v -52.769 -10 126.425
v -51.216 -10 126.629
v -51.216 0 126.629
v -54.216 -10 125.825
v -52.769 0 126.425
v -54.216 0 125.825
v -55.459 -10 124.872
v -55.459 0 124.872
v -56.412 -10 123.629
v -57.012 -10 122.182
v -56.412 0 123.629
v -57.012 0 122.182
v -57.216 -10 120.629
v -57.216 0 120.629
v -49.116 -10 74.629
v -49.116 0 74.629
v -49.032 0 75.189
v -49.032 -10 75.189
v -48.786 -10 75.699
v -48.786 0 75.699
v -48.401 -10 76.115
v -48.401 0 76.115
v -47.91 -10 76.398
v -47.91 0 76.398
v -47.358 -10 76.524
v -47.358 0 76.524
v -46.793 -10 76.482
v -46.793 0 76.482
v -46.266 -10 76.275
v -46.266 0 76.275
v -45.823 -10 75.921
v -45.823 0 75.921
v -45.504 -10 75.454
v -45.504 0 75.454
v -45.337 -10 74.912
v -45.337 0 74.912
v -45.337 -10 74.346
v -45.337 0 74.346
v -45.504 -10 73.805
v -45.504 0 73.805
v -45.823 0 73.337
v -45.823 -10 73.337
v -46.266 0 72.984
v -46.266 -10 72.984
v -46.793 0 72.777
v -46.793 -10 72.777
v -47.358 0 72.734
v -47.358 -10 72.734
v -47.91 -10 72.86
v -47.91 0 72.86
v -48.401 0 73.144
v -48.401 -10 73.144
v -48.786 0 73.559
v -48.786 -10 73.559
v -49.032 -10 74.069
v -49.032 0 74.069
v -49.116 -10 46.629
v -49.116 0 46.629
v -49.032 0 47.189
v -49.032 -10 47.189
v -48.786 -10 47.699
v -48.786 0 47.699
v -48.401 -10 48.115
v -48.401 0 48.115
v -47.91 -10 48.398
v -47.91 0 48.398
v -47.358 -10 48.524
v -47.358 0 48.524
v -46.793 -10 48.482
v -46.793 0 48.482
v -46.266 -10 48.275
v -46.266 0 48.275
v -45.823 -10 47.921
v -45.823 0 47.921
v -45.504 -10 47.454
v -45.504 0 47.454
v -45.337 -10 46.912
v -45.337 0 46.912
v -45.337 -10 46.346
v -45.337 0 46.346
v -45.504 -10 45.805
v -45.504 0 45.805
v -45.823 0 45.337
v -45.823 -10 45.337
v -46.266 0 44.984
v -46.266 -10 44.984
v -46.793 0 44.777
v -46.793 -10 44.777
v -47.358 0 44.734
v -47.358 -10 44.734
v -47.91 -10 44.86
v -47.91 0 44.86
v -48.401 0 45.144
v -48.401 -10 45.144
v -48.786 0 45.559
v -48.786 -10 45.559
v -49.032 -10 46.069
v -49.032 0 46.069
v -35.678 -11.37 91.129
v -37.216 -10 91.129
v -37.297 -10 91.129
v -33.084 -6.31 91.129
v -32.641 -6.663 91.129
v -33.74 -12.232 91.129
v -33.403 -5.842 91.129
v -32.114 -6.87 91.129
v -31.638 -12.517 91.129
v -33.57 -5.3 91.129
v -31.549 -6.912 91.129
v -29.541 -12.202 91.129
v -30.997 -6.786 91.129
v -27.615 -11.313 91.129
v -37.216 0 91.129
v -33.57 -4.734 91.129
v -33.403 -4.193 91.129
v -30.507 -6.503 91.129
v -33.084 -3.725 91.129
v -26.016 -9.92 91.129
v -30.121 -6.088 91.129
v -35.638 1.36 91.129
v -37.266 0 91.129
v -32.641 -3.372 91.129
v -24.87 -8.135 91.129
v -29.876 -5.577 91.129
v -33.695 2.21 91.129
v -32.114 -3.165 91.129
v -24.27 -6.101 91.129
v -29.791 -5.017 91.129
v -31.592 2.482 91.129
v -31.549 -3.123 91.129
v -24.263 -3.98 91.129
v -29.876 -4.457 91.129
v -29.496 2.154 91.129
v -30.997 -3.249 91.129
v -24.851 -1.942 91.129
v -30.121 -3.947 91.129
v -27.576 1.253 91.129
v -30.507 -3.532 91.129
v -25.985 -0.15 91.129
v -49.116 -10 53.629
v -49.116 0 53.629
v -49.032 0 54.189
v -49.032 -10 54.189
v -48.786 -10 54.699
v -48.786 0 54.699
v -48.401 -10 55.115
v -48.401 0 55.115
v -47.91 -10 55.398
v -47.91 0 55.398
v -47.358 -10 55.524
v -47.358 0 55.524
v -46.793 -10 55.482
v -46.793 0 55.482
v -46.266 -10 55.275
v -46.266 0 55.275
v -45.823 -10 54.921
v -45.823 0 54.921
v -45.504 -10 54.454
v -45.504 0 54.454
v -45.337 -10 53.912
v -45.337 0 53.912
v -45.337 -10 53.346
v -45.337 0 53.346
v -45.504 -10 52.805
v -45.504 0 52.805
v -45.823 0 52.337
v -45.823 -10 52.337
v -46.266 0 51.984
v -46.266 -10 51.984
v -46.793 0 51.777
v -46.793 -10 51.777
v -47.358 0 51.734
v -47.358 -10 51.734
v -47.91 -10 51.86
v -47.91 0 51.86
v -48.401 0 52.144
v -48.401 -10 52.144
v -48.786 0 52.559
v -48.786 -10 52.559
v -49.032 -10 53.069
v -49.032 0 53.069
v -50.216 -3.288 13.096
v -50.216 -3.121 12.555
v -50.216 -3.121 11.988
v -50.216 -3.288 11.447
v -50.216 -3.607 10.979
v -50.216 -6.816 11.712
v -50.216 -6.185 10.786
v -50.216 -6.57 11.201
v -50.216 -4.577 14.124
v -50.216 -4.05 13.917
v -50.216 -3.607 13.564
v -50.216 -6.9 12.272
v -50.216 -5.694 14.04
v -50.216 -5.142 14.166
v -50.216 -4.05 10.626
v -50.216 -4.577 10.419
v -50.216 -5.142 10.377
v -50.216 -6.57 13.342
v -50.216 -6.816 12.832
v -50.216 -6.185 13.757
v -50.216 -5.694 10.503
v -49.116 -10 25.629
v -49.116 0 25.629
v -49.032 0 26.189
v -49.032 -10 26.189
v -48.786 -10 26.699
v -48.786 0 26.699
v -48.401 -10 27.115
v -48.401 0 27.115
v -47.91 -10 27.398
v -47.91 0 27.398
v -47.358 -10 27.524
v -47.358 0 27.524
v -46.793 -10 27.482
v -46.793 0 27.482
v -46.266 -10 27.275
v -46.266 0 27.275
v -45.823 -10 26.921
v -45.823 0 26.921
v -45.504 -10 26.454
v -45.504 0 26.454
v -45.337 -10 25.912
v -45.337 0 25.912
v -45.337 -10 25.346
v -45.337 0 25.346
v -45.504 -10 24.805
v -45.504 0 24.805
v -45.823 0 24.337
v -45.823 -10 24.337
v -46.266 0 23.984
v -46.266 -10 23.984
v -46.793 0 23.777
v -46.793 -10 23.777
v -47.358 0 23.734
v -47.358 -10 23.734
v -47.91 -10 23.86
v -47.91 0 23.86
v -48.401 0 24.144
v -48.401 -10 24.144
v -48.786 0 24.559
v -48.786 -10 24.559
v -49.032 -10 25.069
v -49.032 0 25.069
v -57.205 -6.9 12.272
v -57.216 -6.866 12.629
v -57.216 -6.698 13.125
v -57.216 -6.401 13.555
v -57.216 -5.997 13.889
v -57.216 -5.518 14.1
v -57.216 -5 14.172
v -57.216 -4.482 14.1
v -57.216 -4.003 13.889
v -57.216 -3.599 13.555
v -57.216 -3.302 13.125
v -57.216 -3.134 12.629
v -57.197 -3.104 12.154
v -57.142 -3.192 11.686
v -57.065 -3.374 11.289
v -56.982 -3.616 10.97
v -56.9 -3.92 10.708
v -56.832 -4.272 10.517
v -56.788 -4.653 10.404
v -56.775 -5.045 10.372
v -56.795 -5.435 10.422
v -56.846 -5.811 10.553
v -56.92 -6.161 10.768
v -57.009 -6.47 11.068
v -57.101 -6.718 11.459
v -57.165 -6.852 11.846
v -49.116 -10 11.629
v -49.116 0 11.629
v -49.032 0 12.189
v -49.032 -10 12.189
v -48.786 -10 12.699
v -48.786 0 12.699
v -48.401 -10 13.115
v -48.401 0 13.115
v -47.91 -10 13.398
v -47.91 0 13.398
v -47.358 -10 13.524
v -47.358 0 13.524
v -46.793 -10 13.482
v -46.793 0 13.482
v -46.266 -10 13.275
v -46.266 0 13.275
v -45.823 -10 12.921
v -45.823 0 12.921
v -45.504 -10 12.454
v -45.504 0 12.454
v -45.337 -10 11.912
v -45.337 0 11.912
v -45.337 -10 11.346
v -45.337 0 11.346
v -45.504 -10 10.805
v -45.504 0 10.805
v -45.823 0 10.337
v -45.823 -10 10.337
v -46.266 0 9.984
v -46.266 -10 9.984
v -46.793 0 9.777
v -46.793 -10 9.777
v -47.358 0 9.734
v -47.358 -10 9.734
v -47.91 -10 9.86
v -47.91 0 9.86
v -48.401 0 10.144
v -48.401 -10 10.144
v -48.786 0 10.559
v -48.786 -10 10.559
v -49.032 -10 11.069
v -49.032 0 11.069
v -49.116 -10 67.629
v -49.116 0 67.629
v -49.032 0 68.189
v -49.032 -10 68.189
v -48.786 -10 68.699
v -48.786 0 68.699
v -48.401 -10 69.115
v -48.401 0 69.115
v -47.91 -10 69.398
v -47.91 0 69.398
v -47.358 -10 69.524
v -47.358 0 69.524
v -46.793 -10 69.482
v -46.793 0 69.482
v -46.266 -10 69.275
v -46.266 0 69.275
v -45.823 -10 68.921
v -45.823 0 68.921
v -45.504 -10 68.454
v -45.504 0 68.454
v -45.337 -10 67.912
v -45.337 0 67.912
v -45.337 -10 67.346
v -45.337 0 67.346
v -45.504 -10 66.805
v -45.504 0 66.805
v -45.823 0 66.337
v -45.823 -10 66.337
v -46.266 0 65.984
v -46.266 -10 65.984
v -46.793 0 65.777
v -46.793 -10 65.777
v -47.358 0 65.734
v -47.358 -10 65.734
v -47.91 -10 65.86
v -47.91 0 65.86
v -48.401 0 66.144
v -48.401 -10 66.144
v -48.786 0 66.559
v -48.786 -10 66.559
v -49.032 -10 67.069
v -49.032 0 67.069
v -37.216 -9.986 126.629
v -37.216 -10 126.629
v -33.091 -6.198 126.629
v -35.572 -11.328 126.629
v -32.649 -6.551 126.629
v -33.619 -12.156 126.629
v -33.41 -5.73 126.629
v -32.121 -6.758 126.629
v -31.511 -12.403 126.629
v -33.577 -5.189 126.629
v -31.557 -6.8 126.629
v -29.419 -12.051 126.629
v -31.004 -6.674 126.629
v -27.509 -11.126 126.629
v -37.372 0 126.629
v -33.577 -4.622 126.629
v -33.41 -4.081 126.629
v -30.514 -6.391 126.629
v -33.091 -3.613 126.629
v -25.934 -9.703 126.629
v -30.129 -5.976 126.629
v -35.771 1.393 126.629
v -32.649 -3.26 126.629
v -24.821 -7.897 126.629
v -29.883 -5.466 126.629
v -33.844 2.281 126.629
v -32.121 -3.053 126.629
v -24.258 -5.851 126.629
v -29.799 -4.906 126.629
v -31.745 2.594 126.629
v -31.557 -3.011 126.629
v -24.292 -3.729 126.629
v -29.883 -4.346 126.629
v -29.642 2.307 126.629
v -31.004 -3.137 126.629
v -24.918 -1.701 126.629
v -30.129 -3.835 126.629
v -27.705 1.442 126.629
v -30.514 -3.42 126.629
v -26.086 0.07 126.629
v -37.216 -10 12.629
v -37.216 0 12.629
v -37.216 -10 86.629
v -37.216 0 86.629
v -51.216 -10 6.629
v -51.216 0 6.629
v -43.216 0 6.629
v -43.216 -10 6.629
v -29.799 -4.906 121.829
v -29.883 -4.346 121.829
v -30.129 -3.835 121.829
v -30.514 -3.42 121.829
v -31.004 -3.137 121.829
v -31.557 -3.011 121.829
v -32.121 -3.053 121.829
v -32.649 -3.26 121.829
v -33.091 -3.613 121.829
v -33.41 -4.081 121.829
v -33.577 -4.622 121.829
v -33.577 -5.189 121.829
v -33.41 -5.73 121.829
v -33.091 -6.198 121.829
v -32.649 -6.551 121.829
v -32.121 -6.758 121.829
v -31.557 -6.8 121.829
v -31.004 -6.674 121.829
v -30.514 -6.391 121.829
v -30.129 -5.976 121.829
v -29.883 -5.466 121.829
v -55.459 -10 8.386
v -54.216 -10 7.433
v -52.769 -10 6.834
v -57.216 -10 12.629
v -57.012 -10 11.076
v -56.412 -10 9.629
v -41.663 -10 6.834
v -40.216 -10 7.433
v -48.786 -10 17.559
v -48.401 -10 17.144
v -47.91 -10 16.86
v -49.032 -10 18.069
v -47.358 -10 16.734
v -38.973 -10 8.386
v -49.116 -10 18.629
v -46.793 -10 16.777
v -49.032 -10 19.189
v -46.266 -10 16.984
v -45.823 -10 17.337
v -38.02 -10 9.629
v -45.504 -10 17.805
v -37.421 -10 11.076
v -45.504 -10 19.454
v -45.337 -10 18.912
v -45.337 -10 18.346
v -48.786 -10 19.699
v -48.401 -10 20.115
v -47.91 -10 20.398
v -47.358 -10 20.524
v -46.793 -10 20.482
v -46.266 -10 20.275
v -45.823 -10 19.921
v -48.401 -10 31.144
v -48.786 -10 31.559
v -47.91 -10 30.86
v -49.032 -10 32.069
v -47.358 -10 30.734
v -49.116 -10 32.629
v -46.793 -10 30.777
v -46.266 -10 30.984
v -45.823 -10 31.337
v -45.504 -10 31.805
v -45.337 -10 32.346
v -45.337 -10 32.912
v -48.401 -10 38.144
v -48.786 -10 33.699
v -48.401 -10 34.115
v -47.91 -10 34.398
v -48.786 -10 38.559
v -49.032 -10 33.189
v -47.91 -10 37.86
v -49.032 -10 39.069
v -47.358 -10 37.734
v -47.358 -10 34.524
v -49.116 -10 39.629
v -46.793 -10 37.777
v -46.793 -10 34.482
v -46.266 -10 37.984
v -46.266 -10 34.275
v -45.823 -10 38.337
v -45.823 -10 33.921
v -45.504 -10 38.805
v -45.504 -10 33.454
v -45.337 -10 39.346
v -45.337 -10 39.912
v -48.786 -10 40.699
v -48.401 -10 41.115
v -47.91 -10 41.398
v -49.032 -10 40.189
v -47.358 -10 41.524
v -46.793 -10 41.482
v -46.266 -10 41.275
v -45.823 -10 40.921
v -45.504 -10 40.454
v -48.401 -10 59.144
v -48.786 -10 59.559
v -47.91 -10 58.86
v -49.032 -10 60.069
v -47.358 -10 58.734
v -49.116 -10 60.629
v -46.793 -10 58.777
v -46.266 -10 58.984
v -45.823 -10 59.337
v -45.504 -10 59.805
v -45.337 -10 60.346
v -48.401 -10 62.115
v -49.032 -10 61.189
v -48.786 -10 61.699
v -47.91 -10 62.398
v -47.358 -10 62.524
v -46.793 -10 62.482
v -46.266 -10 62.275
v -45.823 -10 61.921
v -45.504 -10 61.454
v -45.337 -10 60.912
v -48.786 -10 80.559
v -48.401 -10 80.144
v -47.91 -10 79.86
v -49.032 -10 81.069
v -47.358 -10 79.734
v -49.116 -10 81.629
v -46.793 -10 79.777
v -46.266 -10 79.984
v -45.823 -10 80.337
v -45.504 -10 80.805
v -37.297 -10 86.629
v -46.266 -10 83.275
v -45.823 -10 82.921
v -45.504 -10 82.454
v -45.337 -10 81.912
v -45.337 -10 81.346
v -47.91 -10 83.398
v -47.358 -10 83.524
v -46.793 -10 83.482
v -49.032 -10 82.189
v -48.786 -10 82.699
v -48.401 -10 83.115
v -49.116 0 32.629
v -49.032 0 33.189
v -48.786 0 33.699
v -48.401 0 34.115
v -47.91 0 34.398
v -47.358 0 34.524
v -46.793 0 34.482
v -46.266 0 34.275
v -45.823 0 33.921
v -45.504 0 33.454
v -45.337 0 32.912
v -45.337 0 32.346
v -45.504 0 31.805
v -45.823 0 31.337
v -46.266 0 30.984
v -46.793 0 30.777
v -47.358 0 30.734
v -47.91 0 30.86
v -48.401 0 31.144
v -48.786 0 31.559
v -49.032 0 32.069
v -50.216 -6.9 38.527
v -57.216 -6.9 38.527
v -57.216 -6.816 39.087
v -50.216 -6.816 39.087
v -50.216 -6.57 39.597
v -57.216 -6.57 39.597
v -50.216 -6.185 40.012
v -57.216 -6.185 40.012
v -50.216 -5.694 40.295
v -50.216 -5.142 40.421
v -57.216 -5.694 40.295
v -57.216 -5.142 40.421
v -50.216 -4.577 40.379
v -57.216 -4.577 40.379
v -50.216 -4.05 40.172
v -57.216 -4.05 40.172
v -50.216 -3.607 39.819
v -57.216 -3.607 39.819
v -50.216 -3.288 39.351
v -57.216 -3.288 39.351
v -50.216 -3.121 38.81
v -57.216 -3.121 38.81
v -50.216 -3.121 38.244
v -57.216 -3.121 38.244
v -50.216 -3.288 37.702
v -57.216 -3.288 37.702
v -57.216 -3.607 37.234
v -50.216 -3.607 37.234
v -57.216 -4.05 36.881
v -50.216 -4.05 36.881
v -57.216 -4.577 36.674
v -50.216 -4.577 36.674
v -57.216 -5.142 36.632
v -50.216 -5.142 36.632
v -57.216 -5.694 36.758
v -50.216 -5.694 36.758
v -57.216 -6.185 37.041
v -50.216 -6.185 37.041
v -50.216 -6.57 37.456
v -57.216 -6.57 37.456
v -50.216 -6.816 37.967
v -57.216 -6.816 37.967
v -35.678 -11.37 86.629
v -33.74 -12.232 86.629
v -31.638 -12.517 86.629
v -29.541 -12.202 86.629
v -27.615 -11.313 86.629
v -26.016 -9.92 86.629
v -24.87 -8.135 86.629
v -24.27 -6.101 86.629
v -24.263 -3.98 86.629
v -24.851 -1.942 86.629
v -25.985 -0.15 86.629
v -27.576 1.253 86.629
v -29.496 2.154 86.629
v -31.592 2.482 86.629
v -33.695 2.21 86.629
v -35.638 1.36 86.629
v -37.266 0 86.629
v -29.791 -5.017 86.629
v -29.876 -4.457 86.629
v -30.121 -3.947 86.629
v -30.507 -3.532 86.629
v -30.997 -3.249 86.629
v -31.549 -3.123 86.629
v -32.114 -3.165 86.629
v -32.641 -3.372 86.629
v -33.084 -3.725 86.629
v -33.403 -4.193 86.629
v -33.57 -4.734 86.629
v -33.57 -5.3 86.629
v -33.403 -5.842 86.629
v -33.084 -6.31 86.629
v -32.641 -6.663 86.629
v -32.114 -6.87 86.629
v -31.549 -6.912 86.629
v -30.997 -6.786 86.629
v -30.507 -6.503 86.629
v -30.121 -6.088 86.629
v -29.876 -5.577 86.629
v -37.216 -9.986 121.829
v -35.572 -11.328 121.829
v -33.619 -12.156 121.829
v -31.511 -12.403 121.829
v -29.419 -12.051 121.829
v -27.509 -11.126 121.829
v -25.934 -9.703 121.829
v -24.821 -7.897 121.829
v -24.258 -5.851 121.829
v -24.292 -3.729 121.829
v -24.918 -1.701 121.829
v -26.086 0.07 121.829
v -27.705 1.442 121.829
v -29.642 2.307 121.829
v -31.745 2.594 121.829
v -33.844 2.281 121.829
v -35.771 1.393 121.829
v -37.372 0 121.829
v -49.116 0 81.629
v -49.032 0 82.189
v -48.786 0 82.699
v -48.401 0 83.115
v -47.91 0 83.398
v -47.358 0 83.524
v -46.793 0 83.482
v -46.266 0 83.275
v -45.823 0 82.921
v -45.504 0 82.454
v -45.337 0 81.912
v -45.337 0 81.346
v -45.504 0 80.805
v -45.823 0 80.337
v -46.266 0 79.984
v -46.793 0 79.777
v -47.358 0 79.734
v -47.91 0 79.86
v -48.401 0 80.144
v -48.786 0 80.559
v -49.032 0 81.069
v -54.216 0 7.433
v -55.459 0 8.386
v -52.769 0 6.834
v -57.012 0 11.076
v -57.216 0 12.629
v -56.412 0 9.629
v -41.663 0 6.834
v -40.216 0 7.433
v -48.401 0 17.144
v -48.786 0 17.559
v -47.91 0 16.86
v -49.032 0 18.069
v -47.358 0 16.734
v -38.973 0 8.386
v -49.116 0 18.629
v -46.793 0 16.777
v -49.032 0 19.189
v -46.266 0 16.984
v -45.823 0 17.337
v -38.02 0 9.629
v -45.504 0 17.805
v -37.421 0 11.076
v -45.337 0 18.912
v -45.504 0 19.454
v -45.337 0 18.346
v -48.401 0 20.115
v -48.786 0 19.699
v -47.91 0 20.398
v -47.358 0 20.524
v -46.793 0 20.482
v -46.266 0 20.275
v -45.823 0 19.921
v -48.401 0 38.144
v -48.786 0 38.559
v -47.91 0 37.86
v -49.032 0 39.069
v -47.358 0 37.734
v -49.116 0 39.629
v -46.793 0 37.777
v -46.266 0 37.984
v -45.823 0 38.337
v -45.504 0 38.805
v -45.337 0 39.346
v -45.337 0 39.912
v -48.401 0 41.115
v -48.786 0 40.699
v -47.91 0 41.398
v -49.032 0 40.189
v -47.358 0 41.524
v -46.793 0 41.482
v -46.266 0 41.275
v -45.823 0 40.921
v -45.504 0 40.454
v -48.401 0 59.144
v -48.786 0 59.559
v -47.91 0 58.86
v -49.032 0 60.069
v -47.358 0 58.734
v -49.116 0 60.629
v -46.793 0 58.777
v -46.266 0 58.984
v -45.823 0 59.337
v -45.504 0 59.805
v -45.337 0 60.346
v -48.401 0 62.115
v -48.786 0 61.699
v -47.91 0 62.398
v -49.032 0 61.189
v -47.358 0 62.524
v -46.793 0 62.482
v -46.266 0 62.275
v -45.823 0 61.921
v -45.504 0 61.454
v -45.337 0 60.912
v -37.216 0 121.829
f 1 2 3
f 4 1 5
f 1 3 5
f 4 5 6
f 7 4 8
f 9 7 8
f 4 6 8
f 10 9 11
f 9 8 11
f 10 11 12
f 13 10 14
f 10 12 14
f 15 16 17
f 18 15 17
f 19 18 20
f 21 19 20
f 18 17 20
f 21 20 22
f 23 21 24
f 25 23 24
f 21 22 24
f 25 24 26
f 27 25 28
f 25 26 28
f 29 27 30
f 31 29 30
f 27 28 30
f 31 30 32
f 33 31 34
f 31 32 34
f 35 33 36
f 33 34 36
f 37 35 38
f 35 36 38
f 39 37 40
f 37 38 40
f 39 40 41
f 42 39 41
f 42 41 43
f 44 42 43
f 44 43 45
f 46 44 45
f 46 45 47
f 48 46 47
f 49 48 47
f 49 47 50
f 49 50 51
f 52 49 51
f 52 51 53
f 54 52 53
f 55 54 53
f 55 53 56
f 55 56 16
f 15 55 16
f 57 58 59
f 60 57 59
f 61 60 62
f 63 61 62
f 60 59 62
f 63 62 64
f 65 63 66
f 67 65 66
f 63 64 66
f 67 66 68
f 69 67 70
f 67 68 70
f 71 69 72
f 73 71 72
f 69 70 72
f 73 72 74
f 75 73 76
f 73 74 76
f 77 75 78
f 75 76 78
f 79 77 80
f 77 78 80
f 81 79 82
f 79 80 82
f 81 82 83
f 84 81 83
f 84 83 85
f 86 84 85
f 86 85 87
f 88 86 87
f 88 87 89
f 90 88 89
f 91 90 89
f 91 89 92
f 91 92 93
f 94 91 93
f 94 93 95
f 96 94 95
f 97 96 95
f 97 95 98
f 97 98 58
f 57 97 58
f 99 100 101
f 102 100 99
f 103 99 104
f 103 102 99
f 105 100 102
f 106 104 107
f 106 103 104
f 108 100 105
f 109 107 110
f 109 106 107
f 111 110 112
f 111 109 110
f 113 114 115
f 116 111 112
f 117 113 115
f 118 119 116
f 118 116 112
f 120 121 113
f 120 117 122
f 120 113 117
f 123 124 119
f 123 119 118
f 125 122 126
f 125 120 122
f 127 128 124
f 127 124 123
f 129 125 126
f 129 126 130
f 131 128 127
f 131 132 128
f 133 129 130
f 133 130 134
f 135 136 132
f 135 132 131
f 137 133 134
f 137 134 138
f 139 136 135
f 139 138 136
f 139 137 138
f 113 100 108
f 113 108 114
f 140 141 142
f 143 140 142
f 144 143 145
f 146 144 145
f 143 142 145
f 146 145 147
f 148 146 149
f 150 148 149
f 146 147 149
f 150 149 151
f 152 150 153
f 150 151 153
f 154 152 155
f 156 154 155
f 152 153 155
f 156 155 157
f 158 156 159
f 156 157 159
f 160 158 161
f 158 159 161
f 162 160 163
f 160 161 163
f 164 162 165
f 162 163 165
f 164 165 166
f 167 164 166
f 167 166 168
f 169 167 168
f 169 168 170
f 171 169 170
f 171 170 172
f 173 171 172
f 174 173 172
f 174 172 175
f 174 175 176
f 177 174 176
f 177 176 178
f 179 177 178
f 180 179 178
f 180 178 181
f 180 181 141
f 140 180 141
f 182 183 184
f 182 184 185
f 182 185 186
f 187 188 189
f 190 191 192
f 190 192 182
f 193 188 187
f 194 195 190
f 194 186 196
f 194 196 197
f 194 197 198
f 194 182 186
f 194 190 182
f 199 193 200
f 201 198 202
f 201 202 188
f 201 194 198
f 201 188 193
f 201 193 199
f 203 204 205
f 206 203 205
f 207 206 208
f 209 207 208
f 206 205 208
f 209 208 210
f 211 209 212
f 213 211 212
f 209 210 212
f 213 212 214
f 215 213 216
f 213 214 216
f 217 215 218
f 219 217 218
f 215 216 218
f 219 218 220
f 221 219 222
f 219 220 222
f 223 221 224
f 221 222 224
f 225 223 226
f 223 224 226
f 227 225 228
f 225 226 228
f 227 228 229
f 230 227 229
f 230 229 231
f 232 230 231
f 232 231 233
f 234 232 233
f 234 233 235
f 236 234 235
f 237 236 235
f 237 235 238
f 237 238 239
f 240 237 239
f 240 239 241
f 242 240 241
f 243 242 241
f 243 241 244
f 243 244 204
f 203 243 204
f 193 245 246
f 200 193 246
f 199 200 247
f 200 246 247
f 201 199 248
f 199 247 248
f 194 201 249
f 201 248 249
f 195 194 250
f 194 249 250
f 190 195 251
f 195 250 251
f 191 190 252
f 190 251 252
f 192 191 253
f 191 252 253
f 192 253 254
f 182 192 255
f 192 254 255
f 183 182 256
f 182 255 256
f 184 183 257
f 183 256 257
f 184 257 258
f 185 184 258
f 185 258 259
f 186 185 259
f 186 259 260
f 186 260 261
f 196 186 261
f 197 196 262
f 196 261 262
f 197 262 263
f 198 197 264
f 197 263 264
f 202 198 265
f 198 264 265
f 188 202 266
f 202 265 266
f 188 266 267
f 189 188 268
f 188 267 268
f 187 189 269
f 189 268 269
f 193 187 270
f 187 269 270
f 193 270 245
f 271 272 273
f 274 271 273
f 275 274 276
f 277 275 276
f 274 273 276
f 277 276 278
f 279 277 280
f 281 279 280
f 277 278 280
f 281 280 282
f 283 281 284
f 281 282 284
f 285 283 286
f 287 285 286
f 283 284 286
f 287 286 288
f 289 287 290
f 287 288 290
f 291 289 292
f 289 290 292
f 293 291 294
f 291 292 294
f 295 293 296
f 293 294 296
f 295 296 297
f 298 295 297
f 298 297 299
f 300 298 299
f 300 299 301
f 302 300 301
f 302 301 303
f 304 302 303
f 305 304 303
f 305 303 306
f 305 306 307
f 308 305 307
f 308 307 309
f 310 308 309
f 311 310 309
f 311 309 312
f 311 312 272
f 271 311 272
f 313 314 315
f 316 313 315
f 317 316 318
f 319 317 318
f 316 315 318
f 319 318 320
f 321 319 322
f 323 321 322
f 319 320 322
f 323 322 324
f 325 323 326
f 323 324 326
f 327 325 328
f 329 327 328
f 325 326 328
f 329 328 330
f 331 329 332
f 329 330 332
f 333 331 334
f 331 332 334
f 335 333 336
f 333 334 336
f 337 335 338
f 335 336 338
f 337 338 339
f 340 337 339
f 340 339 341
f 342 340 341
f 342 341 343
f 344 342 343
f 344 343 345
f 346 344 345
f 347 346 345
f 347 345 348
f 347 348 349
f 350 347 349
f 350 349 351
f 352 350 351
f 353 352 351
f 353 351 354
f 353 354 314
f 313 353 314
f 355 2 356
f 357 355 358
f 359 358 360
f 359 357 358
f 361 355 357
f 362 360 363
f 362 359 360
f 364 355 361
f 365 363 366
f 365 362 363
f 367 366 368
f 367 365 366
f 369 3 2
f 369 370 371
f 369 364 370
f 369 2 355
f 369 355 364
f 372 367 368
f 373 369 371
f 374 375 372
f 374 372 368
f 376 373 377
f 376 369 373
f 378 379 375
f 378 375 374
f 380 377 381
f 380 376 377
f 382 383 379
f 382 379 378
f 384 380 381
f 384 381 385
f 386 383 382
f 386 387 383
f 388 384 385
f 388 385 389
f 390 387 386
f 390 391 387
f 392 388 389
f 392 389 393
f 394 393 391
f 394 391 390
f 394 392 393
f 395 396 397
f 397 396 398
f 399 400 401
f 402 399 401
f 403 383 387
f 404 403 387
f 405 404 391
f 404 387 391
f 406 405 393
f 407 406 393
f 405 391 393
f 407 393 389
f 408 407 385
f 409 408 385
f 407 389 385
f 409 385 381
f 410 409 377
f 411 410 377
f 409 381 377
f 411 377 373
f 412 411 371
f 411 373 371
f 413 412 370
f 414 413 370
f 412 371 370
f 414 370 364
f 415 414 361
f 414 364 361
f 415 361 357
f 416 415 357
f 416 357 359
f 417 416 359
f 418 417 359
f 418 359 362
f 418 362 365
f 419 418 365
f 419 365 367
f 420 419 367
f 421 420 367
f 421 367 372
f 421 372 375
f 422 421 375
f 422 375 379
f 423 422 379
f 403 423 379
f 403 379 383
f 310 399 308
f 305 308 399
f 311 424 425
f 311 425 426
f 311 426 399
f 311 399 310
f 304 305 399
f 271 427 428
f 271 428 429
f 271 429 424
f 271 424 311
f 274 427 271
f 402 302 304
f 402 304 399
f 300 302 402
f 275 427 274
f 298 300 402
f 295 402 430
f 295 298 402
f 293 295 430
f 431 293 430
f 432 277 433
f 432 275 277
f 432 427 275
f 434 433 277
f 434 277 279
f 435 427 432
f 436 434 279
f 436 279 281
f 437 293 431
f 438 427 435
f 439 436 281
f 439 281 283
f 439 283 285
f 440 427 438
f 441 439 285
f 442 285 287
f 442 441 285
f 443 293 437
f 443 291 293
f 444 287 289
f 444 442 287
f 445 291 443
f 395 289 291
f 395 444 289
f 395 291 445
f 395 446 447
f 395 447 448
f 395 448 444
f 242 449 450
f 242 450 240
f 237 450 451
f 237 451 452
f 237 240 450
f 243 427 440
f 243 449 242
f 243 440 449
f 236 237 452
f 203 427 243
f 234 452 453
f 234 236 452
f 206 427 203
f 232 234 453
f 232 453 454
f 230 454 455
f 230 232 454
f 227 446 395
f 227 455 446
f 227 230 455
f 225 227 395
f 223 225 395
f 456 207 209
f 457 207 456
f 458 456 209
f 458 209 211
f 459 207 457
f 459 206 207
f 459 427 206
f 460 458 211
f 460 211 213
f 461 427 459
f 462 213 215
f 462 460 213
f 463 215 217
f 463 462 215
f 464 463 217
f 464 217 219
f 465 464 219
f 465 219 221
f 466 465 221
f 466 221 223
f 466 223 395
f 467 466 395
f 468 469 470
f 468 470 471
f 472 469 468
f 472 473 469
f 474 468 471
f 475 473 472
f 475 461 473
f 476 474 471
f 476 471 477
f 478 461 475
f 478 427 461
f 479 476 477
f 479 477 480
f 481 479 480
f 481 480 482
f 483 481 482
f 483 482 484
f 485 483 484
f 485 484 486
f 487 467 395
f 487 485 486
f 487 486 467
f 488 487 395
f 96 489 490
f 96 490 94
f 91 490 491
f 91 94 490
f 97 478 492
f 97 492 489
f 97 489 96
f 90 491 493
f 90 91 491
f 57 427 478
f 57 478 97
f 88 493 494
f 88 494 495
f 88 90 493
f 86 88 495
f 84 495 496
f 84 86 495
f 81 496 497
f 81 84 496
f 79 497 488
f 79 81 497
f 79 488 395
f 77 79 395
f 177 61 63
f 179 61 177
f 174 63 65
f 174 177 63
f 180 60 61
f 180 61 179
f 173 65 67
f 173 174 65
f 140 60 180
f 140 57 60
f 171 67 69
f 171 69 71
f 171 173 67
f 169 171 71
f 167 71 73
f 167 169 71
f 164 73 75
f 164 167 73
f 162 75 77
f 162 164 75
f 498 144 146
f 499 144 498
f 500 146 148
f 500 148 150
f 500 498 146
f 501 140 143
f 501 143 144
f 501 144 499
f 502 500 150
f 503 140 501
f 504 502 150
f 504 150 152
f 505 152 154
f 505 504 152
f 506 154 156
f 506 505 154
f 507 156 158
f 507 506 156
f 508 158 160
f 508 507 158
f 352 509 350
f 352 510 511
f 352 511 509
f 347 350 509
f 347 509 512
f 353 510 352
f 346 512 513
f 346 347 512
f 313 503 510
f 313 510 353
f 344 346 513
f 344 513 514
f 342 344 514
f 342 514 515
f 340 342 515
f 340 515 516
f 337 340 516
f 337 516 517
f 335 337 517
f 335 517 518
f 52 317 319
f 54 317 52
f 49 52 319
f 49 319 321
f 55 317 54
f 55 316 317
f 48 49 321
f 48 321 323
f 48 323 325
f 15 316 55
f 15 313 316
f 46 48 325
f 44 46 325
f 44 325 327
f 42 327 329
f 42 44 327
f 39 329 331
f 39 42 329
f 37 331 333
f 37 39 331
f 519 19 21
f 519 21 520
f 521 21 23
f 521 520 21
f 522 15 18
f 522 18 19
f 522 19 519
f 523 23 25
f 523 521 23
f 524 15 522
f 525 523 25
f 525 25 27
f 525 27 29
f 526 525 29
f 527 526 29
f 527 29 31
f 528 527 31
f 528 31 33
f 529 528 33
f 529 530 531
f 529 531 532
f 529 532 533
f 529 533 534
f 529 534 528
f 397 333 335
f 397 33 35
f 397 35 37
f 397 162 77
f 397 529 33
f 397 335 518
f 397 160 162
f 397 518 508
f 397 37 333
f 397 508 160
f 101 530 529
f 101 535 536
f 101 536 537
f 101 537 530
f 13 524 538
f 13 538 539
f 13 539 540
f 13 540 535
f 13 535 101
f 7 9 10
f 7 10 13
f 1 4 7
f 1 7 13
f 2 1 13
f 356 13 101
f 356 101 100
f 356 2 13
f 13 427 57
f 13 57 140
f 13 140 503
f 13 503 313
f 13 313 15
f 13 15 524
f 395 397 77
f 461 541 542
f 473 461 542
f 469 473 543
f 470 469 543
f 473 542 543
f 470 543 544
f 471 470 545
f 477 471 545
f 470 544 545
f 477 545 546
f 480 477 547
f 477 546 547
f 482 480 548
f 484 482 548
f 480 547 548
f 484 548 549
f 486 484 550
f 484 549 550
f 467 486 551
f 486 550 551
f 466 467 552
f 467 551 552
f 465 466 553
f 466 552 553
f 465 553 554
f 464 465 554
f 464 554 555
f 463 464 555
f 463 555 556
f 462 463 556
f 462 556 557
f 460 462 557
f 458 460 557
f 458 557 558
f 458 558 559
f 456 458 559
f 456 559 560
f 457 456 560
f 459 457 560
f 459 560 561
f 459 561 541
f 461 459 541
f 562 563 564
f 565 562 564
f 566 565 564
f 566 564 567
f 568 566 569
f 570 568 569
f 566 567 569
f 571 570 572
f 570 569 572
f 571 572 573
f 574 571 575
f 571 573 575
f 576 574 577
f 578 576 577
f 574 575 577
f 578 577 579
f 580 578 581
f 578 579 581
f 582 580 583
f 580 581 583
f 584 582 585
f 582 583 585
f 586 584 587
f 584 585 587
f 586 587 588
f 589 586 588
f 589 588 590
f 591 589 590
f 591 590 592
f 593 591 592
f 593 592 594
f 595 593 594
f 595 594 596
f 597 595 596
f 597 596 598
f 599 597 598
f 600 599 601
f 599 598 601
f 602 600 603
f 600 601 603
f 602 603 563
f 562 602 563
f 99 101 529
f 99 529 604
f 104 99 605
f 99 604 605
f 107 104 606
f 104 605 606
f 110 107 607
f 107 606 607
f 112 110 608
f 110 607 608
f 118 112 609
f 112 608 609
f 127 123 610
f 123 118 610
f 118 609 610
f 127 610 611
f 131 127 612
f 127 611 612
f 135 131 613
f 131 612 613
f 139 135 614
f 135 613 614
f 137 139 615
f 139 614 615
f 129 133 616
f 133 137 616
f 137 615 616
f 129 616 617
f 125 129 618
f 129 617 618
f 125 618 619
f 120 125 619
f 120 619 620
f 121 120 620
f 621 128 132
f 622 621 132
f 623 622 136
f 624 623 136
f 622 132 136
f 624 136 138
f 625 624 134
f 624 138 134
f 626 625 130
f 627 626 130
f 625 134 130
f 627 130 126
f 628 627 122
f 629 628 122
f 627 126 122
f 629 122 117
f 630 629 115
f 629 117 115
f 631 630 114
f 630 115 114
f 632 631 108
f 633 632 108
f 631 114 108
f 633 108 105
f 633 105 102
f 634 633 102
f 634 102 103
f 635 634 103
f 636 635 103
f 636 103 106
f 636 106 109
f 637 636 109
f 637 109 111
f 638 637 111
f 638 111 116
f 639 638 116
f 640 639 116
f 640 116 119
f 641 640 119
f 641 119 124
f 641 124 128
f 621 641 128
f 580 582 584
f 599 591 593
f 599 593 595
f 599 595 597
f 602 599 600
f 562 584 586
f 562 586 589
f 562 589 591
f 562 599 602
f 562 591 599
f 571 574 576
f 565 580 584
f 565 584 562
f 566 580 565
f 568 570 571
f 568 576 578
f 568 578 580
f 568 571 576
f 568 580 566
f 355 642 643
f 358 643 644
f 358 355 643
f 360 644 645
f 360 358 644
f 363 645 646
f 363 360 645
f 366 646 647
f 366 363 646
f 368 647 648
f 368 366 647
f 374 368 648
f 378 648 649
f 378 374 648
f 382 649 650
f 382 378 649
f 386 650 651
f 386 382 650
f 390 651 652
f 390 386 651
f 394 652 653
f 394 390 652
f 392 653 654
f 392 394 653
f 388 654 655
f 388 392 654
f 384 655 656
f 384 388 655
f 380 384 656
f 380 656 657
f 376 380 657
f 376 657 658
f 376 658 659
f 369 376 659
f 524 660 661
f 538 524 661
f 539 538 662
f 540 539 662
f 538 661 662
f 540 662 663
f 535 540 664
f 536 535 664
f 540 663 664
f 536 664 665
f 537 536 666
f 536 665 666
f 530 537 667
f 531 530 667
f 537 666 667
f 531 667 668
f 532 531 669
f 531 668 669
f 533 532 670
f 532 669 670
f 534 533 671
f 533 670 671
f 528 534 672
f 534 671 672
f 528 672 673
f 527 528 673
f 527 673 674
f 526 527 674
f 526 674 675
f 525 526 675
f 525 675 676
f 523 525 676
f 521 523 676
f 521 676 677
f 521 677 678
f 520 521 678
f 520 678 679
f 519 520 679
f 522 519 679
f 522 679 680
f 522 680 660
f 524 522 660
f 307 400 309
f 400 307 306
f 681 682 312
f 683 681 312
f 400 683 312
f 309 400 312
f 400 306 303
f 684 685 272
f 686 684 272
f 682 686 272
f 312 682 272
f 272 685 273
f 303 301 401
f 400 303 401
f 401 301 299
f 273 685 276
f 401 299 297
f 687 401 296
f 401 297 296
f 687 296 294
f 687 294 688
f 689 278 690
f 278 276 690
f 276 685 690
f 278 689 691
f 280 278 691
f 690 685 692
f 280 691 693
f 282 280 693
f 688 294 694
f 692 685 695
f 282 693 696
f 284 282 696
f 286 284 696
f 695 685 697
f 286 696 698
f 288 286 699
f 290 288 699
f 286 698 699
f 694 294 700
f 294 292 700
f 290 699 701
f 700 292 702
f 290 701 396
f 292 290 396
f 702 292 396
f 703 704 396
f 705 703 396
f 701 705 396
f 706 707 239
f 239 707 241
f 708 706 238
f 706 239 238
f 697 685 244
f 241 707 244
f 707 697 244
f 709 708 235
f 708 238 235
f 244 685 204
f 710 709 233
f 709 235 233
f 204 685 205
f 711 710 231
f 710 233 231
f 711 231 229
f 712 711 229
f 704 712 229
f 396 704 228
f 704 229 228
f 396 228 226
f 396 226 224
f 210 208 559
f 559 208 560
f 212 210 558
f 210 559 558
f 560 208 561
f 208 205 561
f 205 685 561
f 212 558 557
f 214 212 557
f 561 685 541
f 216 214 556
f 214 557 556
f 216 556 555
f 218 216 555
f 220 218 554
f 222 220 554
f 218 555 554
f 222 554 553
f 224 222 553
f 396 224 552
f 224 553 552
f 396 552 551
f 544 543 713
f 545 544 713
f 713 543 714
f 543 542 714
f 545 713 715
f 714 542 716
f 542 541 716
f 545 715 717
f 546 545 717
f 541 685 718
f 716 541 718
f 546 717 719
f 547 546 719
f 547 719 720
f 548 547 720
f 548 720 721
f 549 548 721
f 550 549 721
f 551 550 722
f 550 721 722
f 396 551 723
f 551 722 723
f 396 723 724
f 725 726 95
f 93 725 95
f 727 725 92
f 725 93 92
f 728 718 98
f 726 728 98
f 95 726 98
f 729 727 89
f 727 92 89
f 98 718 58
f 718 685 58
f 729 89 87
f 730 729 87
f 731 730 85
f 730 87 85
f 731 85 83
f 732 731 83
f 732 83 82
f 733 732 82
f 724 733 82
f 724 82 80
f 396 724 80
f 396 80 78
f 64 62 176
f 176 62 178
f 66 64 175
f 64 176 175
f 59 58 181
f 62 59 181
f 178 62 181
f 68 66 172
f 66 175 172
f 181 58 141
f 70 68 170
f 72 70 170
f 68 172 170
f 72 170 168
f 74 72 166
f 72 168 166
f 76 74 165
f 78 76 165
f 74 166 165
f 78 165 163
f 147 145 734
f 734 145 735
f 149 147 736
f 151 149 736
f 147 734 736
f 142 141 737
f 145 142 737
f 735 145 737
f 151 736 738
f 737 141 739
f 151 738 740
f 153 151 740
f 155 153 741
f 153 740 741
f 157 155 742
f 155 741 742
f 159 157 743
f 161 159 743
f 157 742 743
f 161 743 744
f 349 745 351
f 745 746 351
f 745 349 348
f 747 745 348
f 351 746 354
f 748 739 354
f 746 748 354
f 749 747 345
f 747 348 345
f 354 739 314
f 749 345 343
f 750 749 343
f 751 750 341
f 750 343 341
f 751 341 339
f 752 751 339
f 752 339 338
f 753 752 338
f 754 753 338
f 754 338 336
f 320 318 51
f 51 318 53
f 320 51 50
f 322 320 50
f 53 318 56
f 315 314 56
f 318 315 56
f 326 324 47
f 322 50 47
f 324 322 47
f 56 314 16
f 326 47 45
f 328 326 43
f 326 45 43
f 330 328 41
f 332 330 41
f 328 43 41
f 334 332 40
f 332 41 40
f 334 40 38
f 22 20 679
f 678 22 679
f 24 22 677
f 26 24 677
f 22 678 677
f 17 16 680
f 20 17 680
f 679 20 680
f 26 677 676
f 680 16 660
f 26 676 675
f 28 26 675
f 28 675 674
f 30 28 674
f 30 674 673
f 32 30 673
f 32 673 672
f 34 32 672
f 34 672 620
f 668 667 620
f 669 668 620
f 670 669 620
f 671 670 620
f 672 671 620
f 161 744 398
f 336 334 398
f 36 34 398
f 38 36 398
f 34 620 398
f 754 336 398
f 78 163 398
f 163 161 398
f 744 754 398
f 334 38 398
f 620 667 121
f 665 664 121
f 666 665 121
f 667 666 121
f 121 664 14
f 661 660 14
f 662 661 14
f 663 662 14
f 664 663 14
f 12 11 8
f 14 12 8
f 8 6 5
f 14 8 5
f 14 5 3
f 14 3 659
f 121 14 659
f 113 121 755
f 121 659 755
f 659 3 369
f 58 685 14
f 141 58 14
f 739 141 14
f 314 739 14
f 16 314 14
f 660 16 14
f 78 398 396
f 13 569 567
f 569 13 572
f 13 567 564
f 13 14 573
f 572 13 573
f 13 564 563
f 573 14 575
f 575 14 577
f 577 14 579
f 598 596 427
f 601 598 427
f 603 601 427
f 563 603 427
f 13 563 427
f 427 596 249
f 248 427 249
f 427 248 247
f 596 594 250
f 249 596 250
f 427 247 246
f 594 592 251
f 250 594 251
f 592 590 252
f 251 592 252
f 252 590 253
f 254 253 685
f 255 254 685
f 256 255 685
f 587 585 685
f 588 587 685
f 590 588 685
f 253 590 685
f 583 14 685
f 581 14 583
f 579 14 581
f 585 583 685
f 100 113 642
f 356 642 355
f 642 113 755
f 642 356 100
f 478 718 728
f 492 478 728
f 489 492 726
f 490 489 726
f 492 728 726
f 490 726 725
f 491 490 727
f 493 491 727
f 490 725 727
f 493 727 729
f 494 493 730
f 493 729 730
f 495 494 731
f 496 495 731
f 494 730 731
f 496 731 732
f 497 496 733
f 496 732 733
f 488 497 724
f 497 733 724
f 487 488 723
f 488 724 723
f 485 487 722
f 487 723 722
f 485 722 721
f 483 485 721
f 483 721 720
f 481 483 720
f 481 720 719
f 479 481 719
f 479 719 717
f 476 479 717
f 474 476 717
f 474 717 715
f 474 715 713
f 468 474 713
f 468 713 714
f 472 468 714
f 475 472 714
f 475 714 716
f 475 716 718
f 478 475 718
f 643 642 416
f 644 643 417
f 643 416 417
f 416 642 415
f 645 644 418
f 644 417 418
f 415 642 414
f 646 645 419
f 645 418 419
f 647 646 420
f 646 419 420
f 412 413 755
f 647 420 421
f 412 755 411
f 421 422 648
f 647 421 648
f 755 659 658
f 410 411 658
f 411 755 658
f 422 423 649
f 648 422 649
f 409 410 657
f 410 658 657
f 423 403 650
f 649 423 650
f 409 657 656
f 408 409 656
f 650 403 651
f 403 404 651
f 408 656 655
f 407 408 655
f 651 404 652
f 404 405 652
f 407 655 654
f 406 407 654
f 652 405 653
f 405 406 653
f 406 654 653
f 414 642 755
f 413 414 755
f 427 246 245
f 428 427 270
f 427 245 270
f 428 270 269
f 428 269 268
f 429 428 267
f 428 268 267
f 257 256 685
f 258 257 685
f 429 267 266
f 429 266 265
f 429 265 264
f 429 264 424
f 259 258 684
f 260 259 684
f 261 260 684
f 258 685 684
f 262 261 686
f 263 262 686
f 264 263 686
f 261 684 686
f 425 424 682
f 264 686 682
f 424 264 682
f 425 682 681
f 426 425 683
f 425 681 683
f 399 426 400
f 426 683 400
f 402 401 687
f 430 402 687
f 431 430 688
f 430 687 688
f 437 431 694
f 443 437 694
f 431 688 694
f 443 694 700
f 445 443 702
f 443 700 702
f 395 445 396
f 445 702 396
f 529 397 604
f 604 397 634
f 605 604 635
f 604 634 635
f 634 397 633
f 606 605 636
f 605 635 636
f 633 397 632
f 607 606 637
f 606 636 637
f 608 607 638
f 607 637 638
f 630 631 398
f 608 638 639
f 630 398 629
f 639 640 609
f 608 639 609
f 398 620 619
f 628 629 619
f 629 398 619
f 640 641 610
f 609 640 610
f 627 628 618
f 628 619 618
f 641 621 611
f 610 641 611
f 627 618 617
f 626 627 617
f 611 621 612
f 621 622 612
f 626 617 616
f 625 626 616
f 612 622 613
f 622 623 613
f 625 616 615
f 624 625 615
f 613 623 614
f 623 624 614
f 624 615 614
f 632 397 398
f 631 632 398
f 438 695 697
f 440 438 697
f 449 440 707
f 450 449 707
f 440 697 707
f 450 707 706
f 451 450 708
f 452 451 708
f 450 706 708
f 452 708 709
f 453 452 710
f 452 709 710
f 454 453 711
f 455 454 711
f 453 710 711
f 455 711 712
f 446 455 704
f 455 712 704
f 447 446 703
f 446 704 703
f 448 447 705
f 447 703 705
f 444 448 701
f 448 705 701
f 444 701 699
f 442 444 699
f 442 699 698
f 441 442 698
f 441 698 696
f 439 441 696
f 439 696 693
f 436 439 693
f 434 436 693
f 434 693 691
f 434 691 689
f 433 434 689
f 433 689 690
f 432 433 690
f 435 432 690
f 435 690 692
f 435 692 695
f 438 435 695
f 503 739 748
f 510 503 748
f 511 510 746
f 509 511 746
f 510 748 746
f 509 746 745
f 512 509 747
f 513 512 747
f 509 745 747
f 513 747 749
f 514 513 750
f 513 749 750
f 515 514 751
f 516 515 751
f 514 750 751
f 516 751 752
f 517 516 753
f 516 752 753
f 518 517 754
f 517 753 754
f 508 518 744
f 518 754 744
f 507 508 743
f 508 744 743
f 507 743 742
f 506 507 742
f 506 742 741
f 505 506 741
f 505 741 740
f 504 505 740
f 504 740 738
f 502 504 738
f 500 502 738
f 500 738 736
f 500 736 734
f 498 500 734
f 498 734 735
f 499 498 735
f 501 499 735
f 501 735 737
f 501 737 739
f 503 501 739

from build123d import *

# Parameters (mm, degrees)
F1_DEPTH  = 10
F2_R      = 7.5
F3_DEPTH  = 4.8
F4_R      = 1.9
F5_DEPTH  = 25
F6_R      = 1.9
F7_DEPTH  = 7
F9_R      = 7.5
F10_DEPTH = 4.5
F11_R     = 1.9
F12_DEPTH = 25
F13_R     = 1.9
F14_DEPTH = 25


with BuildPart() as f1:
    # F0 (on Front) → F1 (new body)
    with BuildSketch(Plane.XZ):
        with BuildLine():
            Line((-37.2161355778, 126.6291381083), (-51.2161355778, 126.6291381083))
            ThreePointArc((-51.2161355778, 126.6291381083), (-55.4587762649, 124.8717787955), (-57.2161355778, 120.6291381083))
            Line((-57.2161355778, 120.6291381083), (-57.2161355778, 12.6291381083))
            ThreePointArc((-57.2161355778, 12.6291381083), (-55.4587762649, 8.3864974212), (-51.2161355778, 6.6291381083))
            Line((-51.2161355778, 6.6291381083), (-43.2161355778, 6.6291381083))
            ThreePointArc((-43.2161355778, 6.6291381083), (-38.9734948907, 8.3864974212), (-37.2161355778, 12.6291381083))
            Line((-37.2161355778, 12.6291381083), (-37.2161355778, 126.6291381083))
        make_face()
    extrude(amount=F1_DEPTH)

    # F2 (on face) → F3 (join)
    with BuildSketch(Plane.XY.offset(126.6291381083)):
        with Locations((-31.6986439976, -4.9055621816)):
            Circle(F2_R)
    extrude(amount=-F3_DEPTH)

    # F4 (on face) → F5 (cut)
    with BuildSketch(Plane.XY.offset(126.6291381083)):
        with Locations((-31.6986439976, -4.9055621816)):
            Circle(F4_R)
    extrude(amount=-F5_DEPTH, mode=Mode.SUBTRACT)

    # F6 (on face) → F7 (cut)
    with BuildSketch(Plane(origin=(-57.2161355778, 0, 0), x_dir=(0, -1, 0), z_dir=(-1, 0, 0))):
        with Locations((5, 38.5266803205)):
            Circle(F6_R)
        with Locations((5, 12.2715812176)):
            Circle(F6_R)
    extrude(amount=-F7_DEPTH, mode=Mode.SUBTRACT)

    # F9 (on offset) → F10 (join)
    with BuildSketch(Plane.XY.offset(86.6291381083)):
        with Locations((-31.6911898553, -5.0173136406)):
            Circle(F9_R)
    extrude(amount=F10_DEPTH)

    # F11 (on face) → F12 (cut)
    with BuildSketch(Plane.XY.offset(91.1291381083)):
        with Locations((-31.6911898553, -5.0173136406)):
            Circle(F11_R)
    extrude(amount=-F12_DEPTH, mode=Mode.SUBTRACT)

    # F13 (on face) → F14 (cut)
    with BuildSketch(Plane(origin=(0, 0, 0), x_dir=(-1, 0, 0), z_dir=(0, 1, 0))):
        with Locations((47.2161355778, 81.6291381083)):
            Circle(F13_R)
        with Locations((47.2161355778, 74.6291381083)):
            Circle(F13_R)
        with Locations((47.2161355778, 53.6291381083)):
            Circle(F13_R)
        with Locations((47.2161355778, 67.6291381083)):
            Circle(F13_R)
        with Locations((47.2161355778, 60.6291381083)):
            Circle(F13_R)
        with Locations((47.2161355778, 18.6291381083)):
            Circle(F13_R)
        with Locations((47.2161355778, 25.6291381083)):
            Circle(F13_R)
        with Locations((47.2161355778, 32.6291381083)):
            Circle(F13_R)
        with Locations((47.2161355778, 39.6291381083)):
            Circle(F13_R)
        with Locations((47.2161355778, 46.6291381083)):
            Circle(F13_R)
        with Locations((47.2161355778, 11.6291381083)):
            Circle(F13_R)
    extrude(amount=-F14_DEPTH, mode=Mode.SUBTRACT)


solid = f1.part
